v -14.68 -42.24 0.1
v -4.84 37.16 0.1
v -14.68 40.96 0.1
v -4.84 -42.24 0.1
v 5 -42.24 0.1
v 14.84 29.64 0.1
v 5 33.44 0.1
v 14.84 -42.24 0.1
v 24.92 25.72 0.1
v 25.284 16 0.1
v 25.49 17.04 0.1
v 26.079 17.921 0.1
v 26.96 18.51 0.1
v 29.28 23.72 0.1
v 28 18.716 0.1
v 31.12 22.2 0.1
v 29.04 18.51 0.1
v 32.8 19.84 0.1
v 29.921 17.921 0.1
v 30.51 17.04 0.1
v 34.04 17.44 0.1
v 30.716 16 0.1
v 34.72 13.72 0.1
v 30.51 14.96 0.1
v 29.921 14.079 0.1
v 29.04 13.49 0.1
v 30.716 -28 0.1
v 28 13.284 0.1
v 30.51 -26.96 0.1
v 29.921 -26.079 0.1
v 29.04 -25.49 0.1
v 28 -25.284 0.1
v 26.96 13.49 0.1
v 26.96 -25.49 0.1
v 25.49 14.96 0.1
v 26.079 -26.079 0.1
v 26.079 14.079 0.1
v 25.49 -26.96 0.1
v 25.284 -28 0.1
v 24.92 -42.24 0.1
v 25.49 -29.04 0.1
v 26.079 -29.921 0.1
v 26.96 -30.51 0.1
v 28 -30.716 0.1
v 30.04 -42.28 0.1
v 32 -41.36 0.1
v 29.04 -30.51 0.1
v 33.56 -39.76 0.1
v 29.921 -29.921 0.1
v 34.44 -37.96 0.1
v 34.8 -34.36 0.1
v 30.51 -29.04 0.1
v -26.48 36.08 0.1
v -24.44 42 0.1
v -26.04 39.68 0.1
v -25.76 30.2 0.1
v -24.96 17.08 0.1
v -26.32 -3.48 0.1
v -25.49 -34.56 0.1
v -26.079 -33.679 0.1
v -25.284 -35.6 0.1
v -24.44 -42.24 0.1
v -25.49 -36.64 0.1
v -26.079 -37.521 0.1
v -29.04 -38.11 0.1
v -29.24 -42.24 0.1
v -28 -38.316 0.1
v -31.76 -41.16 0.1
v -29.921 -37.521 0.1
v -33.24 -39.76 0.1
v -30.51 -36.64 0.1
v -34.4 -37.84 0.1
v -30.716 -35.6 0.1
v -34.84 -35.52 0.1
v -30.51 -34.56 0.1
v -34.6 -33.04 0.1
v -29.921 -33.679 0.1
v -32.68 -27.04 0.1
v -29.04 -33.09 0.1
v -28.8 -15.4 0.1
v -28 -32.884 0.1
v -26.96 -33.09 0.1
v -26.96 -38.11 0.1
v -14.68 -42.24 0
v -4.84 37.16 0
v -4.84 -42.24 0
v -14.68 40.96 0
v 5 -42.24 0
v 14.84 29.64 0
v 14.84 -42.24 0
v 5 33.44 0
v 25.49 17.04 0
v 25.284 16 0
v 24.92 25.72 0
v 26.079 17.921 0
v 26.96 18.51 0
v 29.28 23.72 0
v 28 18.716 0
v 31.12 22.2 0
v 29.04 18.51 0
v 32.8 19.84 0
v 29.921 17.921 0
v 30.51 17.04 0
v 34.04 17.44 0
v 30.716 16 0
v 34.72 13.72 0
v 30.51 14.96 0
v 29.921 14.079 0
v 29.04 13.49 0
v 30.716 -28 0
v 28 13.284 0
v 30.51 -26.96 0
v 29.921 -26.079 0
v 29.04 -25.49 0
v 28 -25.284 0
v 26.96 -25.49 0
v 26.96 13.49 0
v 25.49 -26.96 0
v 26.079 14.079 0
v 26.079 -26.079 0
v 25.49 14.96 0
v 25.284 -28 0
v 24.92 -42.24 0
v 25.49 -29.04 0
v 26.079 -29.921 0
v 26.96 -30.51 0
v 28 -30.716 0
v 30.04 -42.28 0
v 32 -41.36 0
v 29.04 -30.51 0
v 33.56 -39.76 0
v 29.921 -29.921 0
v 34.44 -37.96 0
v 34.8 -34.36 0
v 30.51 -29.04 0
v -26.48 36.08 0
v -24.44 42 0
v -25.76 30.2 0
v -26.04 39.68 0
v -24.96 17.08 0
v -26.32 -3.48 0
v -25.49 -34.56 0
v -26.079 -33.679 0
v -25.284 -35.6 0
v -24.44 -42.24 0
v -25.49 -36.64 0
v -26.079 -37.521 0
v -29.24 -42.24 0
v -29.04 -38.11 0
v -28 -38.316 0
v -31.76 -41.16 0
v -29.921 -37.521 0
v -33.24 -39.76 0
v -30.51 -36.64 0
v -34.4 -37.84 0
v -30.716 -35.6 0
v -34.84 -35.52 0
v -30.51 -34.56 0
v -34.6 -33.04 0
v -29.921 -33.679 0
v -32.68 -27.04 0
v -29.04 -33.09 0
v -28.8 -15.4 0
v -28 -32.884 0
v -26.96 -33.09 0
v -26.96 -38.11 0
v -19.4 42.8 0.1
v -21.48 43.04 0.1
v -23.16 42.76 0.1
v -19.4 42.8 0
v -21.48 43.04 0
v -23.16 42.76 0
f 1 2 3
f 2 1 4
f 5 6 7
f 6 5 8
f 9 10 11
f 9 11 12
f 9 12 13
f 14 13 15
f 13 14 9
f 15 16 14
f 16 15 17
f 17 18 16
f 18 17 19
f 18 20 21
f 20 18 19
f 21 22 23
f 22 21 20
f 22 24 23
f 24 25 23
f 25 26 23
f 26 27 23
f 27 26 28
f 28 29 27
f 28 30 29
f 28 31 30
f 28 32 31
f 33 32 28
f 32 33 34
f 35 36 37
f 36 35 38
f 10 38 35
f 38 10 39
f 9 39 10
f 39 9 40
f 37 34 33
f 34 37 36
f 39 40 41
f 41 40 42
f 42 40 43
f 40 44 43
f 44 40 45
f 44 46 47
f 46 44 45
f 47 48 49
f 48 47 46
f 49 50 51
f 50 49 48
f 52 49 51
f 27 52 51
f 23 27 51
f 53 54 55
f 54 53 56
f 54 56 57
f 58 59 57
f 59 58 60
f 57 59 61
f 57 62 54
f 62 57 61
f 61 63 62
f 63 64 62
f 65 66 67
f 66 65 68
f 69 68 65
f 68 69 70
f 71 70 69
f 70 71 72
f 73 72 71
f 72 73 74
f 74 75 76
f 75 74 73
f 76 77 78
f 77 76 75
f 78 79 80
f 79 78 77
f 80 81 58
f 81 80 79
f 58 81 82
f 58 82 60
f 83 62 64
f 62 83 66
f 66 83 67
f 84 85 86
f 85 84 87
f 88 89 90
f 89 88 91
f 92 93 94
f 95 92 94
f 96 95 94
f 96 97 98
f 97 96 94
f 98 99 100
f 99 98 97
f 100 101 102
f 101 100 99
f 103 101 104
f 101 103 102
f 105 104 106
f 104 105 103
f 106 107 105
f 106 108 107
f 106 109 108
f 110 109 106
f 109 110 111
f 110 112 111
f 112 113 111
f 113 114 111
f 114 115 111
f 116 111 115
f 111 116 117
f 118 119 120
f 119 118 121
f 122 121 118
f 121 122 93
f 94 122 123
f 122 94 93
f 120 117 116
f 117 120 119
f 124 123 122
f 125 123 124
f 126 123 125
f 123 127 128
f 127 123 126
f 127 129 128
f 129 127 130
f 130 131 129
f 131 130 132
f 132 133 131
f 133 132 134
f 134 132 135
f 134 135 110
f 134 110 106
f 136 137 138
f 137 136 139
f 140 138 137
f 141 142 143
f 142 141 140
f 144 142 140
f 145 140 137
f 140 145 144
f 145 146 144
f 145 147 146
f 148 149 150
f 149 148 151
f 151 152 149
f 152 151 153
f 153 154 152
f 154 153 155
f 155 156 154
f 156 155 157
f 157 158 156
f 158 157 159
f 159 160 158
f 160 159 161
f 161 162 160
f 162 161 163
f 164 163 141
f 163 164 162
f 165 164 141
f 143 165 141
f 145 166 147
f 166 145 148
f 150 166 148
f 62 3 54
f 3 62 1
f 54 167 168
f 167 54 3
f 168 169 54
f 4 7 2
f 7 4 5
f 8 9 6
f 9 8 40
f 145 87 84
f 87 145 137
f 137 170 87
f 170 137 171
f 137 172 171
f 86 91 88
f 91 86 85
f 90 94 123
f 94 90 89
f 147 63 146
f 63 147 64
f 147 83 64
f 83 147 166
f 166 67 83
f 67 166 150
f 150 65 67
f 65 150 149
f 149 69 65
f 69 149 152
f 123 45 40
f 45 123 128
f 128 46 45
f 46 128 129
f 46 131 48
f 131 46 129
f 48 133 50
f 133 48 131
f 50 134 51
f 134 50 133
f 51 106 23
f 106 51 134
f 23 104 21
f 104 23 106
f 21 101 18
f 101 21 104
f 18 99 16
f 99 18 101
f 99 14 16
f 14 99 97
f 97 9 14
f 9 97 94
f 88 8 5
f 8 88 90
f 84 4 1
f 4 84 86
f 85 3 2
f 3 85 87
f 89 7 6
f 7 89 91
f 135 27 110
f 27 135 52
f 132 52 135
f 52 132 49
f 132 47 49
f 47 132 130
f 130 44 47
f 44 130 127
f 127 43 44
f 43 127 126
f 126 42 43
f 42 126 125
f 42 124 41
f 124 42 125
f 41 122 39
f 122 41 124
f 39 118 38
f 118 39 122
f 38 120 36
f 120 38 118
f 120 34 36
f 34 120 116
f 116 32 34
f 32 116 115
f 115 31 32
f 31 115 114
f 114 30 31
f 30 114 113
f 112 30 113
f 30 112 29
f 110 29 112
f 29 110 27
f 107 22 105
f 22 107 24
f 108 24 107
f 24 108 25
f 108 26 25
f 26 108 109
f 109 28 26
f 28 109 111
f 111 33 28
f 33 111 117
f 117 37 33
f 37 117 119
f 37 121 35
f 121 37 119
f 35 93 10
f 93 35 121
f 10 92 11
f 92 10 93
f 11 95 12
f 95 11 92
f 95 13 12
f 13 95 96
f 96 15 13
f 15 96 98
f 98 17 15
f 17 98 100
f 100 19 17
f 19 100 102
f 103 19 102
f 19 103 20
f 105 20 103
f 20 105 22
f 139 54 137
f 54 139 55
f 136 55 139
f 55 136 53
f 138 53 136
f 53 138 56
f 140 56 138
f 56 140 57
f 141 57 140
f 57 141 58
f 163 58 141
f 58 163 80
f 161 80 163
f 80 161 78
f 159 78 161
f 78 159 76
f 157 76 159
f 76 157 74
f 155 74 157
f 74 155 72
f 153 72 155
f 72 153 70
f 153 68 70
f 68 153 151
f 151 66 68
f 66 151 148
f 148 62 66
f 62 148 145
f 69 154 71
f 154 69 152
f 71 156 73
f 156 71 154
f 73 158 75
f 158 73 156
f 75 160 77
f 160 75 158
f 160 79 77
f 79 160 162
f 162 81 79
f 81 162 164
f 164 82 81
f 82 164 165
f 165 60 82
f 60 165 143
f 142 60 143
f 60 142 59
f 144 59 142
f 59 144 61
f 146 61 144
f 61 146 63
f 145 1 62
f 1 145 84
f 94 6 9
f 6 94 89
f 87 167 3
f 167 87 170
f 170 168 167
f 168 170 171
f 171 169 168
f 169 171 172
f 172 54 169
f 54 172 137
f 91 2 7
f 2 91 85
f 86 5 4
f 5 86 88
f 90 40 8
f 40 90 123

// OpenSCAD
// file: s/u768s04.scad
use <../../lib.scad>
function ldraw_lib__s__u768s04() = [
// 0 ~Sail 11 x  9 Trapezoidal Edge Stripe  2
// 0 Name: s\u768s04.dat
// 0 Author: Philippe Hurbain [Philo]
// 0 !LDRAW_ORG Subpart UPDATE 2024-01
// 0 !LICENSE Licensed under CC BY 4.0 : see CAreadme.txt
// 
// 0 BFC CERTIFY CCW
  [0,"BFC","CERTIFY"],
  [0,"BFC","CCW"],
// 
// 0 !HISTORY 2024-01-29 [OrionP] Official Update 2024-01
// 
// 
// 4 16 -61.1 0 -105.6 -36.7 0 -105.6 -36.7 -0.25 -105.6 -61.1 -0.25 -105.6
  [4,16,-61.1,0,-105.6,-36.7,0,-105.6,-36.7,-0.25,-105.6,-61.1,-0.25,-105.6],
// 4 16 62.3 0 64.3 37.1 0 74.1 37.1 -0.25 74.1 62.3 -0.25 64.3
  [4,16,62.3,0,64.3,37.1,0,74.1,37.1,-0.25,74.1,62.3,-0.25,64.3],
// 4 16 -36.7 0 102.4 -48.5 0 107 -48.5 -0.25 107 -36.7 -0.25 102.4
  [4,16,-36.7,0,102.4,-48.5,0,107,-48.5,-0.25,107,-36.7,-0.25,102.4],
// 4 16 -48.5 0 107 -53.7 0 107.6 -53.7 -0.25 107.6 -48.5 -0.25 107
  [4,16,-48.5,0,107,-53.7,0,107.6,-53.7,-0.25,107.6,-48.5,-0.25,107],
// 4 16 -53.7 0 107.6 -57.9 0 106.9 -57.9 -0.25 106.9 -53.7 -0.25 107.6
  [4,16,-53.7,0,107.6,-57.9,0,106.9,-57.9,-0.25,106.9,-53.7,-0.25,107.6],
// 4 16 -57.9 0 106.9 -61.1 0 105 -61.1 -0.25 105 -57.9 -0.25 106.9
  [4,16,-57.9,0,106.9,-61.1,0,105,-61.1,-0.25,105,-57.9,-0.25,106.9],
// 4 16 12.5 0 83.6 -12.1 0 92.9 -12.1 -0.25 92.9 12.5 -0.25 83.6
  [4,16,12.5,0,83.6,-12.1,0,92.9,-12.1,-0.25,92.9,12.5,-0.25,83.6],
// 4 16 -12.1 0 -105.6 12.5 0 -105.6 12.5 -0.25 -105.6 -12.1 -0.25 -105.6
  [4,16,-12.1,0,-105.6,12.5,0,-105.6,12.5,-0.25,-105.6,-12.1,-0.25,-105.6],
// 4 16 37.1 0 -105.6 62.3 0 -105.6 62.3 -0.25 -105.6 37.1 -0.25 -105.6
  [4,16,37.1,0,-105.6,62.3,0,-105.6,62.3,-0.25,-105.6,37.1,-0.25,-105.6],
// 5 24 -57.9 0 106.9 -57.9 -0.25 106.9 -61.1 0 105 -53.7 0 107.6
  [5,24,-57.9,0,106.9,-57.9,-0.25,106.9,-61.1,0,105,-53.7,0,107.6],
// 5 24 -48.5 0 107 -48.5 -0.25 107 -53.7 0 107.6 -36.7 0 102.4
  [5,24,-48.5,0,107,-48.5,-0.25,107,-53.7,0,107.6,-36.7,0,102.4],
// 5 24 -53.7 0 107.6 -53.7 -0.25 107.6 -57.9 0 106.9 -48.5 0 107
  [5,24,-53.7,0,107.6,-53.7,-0.25,107.6,-57.9,0,106.9,-48.5,0,107],
];
module ldraw_lib__s__u768s04(step=0, col=false, unit=2/5, alt=false, line=0.2, solid=!$preview)
    makepoly(ldraw_lib__s__u768s04(), step=step, col=col, unit=unit, alt=alt, line=line, solid=solid);
ldraw_lib__s__u768s04(line=0.2);
// file: s/u768s02.scad
use <../../lib.scad>
function ldraw_lib__s__u768s02() = [
// 0 ~Sail 11 x  9 Trapezoidal Surface Stripe  2
// 0 Name: s\u768s02.dat
// 0 Author: Philippe Hurbain [Philo]
// 0 !LDRAW_ORG Subpart UPDATE 2024-01
// 0 !LICENSE Licensed under CC BY 4.0 : see CAreadme.txt
// 
// 0 BFC CERTIFY CCW
  [0,"BFC","CERTIFY"],
  [0,"BFC","CCW"],
// 
// 0 !HISTORY 2024-01-29 [OrionP] Official Update 2024-01
// 
// 
// 4 16 -61.1 0 -105.6 -36.7 0 -105.6 -36.7 0 102.4 -61.1 0 105
  [4,16,-61.1,0,-105.6,-36.7,0,-105.6,-36.7,0,102.4,-61.1,0,105],
// 4 16 -61.1 0 105 -36.7 0 102.4 -48.5 0 107 -53.7 0 107.6
  [4,16,-61.1,0,105,-36.7,0,102.4,-48.5,0,107,-53.7,0,107.6],
// 3 16 -53.7 0 107.6 -57.9 0 106.9 -61.1 0 105
  [3,16,-53.7,0,107.6,-57.9,0,106.9,-61.1,0,105],
// 4 16 12.5 0 83.6 -12.1 0 92.9 -12.1 0 -105.6 12.5 0 -105.6
  [4,16,12.5,0,83.6,-12.1,0,92.9,-12.1,0,-105.6,12.5,0,-105.6],
// 4 16 37.1 0 -105.6 62.3 0 -105.6 62.3 0 64.3 37.1 0 74.1
  [4,16,37.1,0,-105.6,62.3,0,-105.6,62.3,0,64.3,37.1,0,74.1],
// 2 24 37.1 0 -105.6 62.3 0 -105.6
  [2,24,37.1,0,-105.6,62.3,0,-105.6],
// 2 24 -61.1 0 -105.6 -36.7 0 -105.6
  [2,24,-61.1,0,-105.6,-36.7,0,-105.6],
// 2 24 62.3 0 64.3 37.1 0 74.1
  [2,24,62.3,0,64.3,37.1,0,74.1],
// 2 24 -53.7 0 107.6 -57.9 0 106.9
  [2,24,-53.7,0,107.6,-57.9,0,106.9],
// 2 24 -57.9 0 106.9 -61.1 0 105
  [2,24,-57.9,0,106.9,-61.1,0,105],
// 2 24 12.5 0 83.6 -12.1 0 92.9
  [2,24,12.5,0,83.6,-12.1,0,92.9],
// 2 24 -48.5 0 107 -53.7 0 107.6
  [2,24,-48.5,0,107,-53.7,0,107.6],
// 2 24 -36.7 0 102.4 -48.5 0 107
  [2,24,-36.7,0,102.4,-48.5,0,107],
// 2 24 -12.1 0 -105.6 12.5 0 -105.6
  [2,24,-12.1,0,-105.6,12.5,0,-105.6],
];
module ldraw_lib__s__u768s02(step=0, col=false, unit=2/5, alt=false, line=0.2, solid=!$preview)
    makepoly(ldraw_lib__s__u768s02(), step=step, col=col, unit=unit, alt=alt, line=line, solid=solid);
ldraw_lib__s__u768s02(line=0.2);
// main file
use <../lib.scad>
use <s/u768s01.scad>
use <s/u768s02.scad>
use <s/u768s03.scad>
use <s/u768s04.scad>
function ldraw_lib__u768() = [
// 0 Sail 11 x  9 Trapezoidal
// 0 Name: u768.dat
// 0 Author: Philippe Hurbain [Philo]
// 0 !LDRAW_ORG Part UPDATE 2024-01
// 0 !LICENSE Licensed under CC BY 4.0 : see CAreadme.txt
// 
// 0 BFC CERTIFY CCW
  [0,"BFC","CERTIFY"],
  [0,"BFC","CCW"],
// 
// 0 !CATEGORY Sheet Fabric
// 
// 0 !HISTORY 2024-01-29 [OrionP] Official Update 2024-01
// 
// 
// 1 16 0 -0.25 0 1 0 0 0 1 0 0 0 1 s\u768s01.dat
  [1,16,0,-0.25,0,1,0,0,0,1,0,0,0,1, ldraw_lib__s__u768s01()],
// 1 16 0 0 0 1 0 0 0 -1 0 0 0 1 s\u768s01.dat
  [1,16,0,0,0,1,0,0,0,-1,0,0,0,1, ldraw_lib__s__u768s01()],
// 1 16 0 -0.25 0 1 0 0 0 1 0 0 0 1 s\u768s02.dat
  [1,16,0,-0.25,0,1,0,0,0,1,0,0,0,1, ldraw_lib__s__u768s02()],
// 1 16 0 0 0 1 0 0 0 -1 0 0 0 1 s\u768s02.dat
  [1,16,0,0,0,1,0,0,0,-1,0,0,0,1, ldraw_lib__s__u768s02()],
// 1 16 0 0 0 1 0 0 0 1 0 0 0 1 s\u768s03.dat
  [1,16,0,0,0,1,0,0,0,1,0,0,0,1, ldraw_lib__s__u768s03()],
// 1 16 0 0 0 1 0 0 0 1 0 0 0 1 s\u768s04.dat
  [1,16,0,0,0,1,0,0,0,1,0,0,0,1, ldraw_lib__s__u768s04()],
];
module ldraw_lib__u768(step=0, col=false, unit=2/5, alt=false, line=0.2, solid=!$preview)
    makepoly(ldraw_lib__u768(), step=step, col=col, unit=unit, alt=alt, line=line, solid=solid);
ldraw_lib__u768(line=0.2);
